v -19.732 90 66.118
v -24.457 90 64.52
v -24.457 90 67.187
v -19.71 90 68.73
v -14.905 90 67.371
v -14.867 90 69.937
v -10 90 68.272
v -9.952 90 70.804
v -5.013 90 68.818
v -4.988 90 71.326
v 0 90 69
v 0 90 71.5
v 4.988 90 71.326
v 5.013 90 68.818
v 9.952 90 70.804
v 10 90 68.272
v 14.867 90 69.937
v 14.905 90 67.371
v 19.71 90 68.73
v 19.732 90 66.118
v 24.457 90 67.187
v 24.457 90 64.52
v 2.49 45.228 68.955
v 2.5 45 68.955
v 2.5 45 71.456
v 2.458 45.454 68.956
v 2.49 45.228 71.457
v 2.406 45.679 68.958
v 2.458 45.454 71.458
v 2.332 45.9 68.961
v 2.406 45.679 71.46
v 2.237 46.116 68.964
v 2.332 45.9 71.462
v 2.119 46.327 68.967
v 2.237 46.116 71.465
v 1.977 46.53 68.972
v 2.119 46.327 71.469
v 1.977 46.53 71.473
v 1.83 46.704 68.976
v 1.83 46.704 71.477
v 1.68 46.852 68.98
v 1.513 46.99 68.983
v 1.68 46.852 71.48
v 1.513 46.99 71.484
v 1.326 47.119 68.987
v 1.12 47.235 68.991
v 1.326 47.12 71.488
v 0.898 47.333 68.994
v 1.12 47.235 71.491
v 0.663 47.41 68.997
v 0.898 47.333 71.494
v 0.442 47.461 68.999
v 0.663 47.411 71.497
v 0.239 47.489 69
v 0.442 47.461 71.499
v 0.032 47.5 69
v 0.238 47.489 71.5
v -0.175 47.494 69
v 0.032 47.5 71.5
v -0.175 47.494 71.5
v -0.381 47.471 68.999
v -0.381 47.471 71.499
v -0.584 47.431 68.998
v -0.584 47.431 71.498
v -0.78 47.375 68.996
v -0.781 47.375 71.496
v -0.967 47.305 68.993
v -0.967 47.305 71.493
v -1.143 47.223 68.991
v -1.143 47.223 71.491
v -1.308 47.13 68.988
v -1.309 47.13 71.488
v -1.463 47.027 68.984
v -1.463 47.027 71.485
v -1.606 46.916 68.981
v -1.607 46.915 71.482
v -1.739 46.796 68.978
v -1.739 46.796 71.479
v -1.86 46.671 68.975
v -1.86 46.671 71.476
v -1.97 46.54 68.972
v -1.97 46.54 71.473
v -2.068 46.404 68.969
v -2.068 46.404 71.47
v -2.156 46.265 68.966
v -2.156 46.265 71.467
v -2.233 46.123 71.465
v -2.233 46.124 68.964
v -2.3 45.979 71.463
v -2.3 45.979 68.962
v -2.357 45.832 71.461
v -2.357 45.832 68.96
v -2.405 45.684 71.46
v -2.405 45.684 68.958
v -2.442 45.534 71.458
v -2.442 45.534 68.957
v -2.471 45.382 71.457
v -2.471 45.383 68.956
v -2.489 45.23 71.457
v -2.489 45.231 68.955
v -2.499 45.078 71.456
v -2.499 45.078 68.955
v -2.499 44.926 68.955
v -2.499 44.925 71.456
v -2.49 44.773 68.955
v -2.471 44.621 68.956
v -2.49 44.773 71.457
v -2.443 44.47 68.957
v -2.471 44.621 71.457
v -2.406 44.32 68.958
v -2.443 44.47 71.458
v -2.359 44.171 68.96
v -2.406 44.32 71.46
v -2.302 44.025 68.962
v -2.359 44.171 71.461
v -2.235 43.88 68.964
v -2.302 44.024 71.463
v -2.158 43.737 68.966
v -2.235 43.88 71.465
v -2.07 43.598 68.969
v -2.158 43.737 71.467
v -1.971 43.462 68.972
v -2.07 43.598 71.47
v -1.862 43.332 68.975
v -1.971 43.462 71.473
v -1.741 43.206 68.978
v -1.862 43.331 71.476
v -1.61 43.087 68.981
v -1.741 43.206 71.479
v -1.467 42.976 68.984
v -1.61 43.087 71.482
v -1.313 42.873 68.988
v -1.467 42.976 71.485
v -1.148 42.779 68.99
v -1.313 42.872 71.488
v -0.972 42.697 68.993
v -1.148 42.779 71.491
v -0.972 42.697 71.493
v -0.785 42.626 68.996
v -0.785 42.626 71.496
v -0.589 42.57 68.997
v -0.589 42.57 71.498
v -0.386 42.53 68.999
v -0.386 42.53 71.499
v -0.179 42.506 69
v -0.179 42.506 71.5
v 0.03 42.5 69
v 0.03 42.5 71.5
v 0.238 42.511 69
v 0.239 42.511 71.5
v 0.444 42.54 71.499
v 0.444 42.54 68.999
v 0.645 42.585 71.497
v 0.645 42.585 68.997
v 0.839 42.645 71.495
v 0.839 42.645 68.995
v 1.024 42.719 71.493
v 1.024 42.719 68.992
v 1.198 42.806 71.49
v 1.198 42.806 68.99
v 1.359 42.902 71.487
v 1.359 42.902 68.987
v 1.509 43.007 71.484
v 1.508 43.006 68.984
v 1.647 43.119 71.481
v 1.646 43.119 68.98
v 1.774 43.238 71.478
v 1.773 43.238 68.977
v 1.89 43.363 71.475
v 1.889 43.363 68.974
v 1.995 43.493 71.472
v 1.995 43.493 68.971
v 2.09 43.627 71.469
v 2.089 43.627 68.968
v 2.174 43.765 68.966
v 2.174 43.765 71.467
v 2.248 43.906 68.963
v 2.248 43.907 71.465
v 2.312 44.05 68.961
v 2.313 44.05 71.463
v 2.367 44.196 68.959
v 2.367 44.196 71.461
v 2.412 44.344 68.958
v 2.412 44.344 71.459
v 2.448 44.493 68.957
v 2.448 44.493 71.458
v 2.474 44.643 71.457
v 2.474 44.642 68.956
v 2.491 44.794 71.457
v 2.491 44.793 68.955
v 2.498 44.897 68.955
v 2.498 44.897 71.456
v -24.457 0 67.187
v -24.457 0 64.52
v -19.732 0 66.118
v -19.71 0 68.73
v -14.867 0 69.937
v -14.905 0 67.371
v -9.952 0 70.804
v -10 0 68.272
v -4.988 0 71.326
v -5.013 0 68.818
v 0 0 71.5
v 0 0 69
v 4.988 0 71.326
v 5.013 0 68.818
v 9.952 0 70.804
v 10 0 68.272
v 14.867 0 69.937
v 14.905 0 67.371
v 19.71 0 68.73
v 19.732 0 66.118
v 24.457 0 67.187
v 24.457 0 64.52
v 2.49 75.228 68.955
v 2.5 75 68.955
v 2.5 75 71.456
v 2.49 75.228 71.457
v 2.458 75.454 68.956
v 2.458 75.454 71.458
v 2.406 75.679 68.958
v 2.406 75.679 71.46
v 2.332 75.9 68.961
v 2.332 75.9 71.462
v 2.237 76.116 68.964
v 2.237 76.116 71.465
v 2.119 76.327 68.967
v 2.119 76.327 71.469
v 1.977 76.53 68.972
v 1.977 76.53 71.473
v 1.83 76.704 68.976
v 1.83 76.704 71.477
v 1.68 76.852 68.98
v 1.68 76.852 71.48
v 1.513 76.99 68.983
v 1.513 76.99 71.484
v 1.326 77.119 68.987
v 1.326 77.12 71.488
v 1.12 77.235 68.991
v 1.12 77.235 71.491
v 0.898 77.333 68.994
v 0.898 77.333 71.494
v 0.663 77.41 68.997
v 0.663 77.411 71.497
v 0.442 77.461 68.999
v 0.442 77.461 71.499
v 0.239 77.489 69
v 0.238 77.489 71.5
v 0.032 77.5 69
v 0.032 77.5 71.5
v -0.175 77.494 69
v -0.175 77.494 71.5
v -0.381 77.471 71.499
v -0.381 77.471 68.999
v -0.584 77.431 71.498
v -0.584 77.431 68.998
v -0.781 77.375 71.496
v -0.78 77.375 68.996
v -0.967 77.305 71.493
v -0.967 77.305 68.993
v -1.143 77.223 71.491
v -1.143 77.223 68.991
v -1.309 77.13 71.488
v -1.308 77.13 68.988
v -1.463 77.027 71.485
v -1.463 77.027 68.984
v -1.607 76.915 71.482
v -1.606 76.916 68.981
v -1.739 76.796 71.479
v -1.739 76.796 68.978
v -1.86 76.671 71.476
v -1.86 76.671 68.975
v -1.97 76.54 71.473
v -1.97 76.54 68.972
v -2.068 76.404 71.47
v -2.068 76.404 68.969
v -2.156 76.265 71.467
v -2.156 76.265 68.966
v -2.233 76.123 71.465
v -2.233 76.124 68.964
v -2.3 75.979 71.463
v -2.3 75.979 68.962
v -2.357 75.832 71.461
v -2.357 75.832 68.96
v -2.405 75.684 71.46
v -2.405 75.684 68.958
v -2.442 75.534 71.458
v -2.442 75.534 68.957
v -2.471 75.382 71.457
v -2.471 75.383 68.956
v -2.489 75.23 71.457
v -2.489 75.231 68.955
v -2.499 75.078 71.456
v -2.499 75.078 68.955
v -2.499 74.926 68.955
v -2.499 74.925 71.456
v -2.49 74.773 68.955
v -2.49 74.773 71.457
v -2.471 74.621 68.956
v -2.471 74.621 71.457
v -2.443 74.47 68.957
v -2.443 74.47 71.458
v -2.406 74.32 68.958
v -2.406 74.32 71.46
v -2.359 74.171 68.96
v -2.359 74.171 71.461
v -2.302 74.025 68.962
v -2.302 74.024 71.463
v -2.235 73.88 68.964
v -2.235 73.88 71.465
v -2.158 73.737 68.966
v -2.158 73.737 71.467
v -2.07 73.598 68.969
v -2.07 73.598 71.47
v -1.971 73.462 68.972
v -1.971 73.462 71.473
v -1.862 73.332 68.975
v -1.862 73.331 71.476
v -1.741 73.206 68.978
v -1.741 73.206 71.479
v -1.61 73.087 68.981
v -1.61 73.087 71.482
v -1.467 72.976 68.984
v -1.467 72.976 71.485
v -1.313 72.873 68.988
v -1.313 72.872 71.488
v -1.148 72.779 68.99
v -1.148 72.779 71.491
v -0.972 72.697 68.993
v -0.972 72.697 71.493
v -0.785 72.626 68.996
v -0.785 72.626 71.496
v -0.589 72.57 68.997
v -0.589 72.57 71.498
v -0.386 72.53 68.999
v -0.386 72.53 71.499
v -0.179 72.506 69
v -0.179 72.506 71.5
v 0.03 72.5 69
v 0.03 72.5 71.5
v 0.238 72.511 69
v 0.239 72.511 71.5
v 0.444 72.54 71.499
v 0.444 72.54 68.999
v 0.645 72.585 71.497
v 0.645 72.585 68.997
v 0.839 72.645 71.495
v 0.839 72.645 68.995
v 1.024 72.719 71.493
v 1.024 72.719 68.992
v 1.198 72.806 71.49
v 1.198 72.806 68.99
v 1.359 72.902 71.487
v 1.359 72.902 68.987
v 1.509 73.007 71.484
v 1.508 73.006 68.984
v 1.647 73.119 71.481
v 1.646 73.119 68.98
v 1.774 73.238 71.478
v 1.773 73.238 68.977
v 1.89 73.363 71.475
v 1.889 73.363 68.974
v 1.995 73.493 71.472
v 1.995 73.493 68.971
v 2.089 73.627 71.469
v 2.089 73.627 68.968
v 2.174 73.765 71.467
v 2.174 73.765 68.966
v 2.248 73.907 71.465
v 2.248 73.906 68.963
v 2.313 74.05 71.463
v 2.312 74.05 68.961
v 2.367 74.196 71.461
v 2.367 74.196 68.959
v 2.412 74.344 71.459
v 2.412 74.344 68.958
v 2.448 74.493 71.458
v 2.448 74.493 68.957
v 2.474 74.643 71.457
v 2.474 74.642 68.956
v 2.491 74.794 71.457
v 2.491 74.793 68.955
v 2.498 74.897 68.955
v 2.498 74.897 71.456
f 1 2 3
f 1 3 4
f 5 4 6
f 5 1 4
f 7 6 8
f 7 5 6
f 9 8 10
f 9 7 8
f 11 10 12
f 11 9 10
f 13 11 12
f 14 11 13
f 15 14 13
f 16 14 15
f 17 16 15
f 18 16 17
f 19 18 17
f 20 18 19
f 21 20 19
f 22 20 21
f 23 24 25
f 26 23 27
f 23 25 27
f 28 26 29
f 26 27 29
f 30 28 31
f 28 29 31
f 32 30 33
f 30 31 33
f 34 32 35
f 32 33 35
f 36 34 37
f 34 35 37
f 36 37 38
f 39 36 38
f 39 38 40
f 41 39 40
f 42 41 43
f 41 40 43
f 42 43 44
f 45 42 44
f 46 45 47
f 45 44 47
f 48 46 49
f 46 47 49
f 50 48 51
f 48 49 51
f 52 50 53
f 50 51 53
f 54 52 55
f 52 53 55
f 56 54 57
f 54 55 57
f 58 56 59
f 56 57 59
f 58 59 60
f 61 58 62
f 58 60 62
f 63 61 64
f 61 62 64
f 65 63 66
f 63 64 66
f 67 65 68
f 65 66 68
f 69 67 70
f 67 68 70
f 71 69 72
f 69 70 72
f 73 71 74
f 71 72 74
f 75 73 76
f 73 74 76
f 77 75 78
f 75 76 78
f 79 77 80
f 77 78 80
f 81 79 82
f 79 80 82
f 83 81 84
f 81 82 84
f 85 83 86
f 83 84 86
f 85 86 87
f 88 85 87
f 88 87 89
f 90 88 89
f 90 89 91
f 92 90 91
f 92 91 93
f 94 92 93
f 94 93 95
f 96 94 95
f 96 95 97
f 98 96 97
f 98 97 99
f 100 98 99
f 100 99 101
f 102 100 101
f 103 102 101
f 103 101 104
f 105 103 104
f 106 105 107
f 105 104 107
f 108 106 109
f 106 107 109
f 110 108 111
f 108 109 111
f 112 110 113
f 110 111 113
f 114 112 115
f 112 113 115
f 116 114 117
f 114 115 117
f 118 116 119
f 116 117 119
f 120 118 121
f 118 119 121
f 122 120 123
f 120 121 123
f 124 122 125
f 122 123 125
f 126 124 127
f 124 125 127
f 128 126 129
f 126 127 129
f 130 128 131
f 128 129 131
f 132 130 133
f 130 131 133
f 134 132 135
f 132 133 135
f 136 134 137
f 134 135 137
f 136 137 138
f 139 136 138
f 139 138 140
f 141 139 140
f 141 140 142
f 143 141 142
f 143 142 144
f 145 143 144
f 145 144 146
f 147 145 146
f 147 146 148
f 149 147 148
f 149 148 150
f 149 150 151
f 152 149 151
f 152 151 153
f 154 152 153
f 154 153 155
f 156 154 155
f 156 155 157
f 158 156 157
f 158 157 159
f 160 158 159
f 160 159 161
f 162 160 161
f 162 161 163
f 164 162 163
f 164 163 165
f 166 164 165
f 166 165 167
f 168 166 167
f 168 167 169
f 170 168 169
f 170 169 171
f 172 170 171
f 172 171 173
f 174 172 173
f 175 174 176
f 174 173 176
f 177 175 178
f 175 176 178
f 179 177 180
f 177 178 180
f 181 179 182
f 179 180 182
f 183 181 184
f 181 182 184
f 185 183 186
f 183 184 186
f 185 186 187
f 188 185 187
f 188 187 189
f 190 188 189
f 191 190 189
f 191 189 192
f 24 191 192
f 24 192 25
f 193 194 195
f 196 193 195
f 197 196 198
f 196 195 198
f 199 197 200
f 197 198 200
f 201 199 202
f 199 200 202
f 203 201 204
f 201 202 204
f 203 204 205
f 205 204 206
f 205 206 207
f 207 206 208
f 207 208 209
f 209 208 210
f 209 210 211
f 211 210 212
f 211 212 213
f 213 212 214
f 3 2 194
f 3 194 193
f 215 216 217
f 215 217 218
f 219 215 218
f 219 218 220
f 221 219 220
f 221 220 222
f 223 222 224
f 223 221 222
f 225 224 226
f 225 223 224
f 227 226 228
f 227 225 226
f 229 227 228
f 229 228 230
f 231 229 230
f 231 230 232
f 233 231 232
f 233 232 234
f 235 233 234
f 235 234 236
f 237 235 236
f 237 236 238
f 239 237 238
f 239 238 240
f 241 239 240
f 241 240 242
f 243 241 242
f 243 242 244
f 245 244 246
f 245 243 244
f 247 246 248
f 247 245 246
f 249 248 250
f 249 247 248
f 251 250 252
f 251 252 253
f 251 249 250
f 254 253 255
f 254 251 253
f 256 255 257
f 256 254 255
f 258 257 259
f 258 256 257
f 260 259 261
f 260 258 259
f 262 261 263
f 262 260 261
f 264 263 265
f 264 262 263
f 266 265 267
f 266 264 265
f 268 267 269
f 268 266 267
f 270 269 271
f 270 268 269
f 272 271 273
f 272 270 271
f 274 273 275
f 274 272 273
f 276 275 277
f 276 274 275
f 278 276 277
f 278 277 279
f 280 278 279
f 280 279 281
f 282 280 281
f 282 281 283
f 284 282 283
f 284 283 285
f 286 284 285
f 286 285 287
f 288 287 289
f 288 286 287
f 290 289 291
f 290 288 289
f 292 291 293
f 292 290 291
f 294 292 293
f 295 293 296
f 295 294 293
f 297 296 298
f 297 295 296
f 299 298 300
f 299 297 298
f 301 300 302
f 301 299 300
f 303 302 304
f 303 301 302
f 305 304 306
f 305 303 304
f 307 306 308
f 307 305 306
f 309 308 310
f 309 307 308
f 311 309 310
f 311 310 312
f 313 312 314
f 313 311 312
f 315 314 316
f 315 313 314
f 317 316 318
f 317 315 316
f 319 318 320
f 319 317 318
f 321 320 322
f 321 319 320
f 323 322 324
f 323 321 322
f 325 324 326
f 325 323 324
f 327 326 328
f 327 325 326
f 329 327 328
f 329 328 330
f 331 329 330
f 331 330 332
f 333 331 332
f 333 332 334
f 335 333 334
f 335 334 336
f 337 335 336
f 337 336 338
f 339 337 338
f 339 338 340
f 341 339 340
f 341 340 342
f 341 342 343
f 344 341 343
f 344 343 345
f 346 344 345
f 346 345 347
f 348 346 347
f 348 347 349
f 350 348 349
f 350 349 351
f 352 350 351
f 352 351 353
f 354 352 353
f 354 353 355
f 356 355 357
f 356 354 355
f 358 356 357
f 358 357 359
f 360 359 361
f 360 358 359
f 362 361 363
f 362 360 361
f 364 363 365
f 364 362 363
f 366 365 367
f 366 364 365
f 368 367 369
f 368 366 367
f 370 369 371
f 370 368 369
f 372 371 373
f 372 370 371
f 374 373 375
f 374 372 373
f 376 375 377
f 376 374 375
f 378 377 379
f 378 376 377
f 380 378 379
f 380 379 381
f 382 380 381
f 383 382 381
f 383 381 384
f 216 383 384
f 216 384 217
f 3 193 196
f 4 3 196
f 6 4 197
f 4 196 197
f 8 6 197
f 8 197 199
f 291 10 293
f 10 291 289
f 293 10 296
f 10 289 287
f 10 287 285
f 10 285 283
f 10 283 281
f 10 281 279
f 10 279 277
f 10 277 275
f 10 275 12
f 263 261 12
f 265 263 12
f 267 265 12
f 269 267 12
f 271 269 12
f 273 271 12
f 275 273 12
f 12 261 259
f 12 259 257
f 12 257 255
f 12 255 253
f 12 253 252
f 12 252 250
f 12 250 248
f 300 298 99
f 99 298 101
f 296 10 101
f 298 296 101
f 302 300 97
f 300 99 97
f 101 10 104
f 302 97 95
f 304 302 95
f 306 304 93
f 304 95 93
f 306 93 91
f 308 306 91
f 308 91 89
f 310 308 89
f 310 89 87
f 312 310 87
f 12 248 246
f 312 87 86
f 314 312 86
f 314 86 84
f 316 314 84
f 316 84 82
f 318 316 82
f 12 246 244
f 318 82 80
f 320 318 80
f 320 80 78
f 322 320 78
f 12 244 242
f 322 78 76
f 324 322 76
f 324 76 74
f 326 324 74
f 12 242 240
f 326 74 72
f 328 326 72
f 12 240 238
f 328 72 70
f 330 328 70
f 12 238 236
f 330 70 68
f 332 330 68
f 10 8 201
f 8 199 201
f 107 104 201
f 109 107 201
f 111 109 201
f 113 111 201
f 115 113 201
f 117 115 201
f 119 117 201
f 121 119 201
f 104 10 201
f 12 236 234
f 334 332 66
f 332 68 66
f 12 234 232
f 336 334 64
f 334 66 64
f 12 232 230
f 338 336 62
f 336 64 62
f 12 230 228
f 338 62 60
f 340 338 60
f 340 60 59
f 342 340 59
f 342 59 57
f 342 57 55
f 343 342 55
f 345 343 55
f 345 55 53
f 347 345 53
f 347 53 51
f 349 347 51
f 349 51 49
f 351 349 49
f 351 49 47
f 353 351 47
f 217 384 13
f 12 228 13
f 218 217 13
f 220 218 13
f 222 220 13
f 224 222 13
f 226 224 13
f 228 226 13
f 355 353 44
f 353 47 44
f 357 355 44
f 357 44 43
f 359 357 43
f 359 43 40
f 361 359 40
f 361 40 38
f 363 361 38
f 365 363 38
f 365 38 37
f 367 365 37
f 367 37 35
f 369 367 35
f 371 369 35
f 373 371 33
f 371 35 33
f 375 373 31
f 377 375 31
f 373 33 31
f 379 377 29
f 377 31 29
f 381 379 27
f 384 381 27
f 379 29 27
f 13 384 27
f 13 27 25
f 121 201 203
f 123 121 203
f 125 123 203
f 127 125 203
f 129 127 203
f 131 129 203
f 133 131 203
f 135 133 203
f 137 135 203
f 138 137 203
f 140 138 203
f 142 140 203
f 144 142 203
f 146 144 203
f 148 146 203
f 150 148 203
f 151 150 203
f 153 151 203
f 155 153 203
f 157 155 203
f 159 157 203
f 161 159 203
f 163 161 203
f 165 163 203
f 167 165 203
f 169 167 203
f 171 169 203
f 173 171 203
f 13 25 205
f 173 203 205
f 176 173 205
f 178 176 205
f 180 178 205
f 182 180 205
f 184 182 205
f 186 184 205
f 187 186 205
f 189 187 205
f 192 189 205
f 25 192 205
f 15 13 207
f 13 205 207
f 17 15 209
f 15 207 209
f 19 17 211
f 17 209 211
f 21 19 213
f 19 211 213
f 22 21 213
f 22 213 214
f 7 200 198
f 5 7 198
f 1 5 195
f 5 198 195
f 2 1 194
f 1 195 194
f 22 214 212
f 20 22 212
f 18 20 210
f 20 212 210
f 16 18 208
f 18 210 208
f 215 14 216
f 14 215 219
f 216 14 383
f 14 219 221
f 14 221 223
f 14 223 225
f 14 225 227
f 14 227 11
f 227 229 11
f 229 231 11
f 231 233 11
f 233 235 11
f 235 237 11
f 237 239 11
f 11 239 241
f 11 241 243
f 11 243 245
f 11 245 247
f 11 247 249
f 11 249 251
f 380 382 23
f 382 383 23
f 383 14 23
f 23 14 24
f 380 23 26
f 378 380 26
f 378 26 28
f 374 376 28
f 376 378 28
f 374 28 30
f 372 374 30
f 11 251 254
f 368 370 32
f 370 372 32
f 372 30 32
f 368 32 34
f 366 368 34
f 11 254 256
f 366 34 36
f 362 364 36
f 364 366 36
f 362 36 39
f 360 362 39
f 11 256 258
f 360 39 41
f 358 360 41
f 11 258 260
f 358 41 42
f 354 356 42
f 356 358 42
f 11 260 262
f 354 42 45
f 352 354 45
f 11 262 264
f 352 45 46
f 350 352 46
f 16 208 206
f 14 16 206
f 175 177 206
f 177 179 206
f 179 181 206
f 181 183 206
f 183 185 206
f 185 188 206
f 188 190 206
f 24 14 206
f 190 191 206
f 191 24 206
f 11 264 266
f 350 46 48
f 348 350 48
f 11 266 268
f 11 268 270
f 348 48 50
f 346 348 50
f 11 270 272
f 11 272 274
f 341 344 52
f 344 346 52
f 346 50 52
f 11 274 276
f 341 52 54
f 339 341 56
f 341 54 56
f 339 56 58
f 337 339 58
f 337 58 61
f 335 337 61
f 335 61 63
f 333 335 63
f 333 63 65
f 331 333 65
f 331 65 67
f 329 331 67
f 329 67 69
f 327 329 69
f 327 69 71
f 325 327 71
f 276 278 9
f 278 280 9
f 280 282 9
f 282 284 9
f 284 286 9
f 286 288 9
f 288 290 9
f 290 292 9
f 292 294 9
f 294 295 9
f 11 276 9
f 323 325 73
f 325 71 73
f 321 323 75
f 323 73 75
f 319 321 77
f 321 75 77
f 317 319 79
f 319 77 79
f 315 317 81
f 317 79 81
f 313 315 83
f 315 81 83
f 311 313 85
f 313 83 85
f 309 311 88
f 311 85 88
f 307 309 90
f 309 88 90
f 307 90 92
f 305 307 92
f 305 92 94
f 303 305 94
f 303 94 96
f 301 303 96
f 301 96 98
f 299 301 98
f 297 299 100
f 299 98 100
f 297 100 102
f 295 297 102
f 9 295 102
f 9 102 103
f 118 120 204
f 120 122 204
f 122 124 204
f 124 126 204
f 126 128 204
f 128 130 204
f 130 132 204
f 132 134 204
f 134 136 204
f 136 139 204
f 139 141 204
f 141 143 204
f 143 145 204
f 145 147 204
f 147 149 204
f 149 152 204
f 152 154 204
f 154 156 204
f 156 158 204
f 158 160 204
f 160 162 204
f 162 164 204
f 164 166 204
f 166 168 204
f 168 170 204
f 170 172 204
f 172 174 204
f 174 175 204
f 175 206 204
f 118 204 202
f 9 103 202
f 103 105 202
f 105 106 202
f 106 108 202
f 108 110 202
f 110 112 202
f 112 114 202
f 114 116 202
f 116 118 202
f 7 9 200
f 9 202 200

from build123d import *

# Parameters (mm, degrees)
BOSS_EXTRUDE9_DEPTH = 90
SKETCH17_R          = 2.5
CUT_EXTRUDE1_DEPTH  = 5


with BuildPart() as part:
    # Sketch1 → Boss-Extrude9 (new body)
    with BuildSketch(Plane(origin=(0, 0, 0), x_dir=(1, 0, 0), z_dir=(0, 1, 0))):
        with BuildLine():
            ThreePointArc((-10, -68.271516755), (-17.330093713, -66.788231388), (-24.456600104, -64.520343391))
            Line((-24.456600104, -64.520343391), (-24.456600104, -67.187236223))
            ThreePointArc((-24.456600104, -67.187236223), (0, -71.5), (24.456600104, -67.187236223))
            Line((24.456600104, -67.187236223), (24.456600104, -64.520343391))
            ThreePointArc((24.456600104, -64.520343391), (17.330093713, -66.788231388), (10, -68.271516755))
            ThreePointArc((10, -68.271516755), (0, -69), (-10, -68.271516755))
        make_face()
    extrude(amount=BOSS_EXTRUDE9_DEPTH)

    # Sketch17 → Cut-Extrude1 (cut, symmetric)
    with BuildSketch(Plane.XY.offset(67.187236223)):
        with Locations((0, 75)):
            Circle(SKETCH17_R)
        with Locations((0, 45)):
            Circle(SKETCH17_R)
    extrude(amount=CUT_EXTRUDE1_DEPTH, both=True, mode=Mode.SUBTRACT)


solid = part.part
